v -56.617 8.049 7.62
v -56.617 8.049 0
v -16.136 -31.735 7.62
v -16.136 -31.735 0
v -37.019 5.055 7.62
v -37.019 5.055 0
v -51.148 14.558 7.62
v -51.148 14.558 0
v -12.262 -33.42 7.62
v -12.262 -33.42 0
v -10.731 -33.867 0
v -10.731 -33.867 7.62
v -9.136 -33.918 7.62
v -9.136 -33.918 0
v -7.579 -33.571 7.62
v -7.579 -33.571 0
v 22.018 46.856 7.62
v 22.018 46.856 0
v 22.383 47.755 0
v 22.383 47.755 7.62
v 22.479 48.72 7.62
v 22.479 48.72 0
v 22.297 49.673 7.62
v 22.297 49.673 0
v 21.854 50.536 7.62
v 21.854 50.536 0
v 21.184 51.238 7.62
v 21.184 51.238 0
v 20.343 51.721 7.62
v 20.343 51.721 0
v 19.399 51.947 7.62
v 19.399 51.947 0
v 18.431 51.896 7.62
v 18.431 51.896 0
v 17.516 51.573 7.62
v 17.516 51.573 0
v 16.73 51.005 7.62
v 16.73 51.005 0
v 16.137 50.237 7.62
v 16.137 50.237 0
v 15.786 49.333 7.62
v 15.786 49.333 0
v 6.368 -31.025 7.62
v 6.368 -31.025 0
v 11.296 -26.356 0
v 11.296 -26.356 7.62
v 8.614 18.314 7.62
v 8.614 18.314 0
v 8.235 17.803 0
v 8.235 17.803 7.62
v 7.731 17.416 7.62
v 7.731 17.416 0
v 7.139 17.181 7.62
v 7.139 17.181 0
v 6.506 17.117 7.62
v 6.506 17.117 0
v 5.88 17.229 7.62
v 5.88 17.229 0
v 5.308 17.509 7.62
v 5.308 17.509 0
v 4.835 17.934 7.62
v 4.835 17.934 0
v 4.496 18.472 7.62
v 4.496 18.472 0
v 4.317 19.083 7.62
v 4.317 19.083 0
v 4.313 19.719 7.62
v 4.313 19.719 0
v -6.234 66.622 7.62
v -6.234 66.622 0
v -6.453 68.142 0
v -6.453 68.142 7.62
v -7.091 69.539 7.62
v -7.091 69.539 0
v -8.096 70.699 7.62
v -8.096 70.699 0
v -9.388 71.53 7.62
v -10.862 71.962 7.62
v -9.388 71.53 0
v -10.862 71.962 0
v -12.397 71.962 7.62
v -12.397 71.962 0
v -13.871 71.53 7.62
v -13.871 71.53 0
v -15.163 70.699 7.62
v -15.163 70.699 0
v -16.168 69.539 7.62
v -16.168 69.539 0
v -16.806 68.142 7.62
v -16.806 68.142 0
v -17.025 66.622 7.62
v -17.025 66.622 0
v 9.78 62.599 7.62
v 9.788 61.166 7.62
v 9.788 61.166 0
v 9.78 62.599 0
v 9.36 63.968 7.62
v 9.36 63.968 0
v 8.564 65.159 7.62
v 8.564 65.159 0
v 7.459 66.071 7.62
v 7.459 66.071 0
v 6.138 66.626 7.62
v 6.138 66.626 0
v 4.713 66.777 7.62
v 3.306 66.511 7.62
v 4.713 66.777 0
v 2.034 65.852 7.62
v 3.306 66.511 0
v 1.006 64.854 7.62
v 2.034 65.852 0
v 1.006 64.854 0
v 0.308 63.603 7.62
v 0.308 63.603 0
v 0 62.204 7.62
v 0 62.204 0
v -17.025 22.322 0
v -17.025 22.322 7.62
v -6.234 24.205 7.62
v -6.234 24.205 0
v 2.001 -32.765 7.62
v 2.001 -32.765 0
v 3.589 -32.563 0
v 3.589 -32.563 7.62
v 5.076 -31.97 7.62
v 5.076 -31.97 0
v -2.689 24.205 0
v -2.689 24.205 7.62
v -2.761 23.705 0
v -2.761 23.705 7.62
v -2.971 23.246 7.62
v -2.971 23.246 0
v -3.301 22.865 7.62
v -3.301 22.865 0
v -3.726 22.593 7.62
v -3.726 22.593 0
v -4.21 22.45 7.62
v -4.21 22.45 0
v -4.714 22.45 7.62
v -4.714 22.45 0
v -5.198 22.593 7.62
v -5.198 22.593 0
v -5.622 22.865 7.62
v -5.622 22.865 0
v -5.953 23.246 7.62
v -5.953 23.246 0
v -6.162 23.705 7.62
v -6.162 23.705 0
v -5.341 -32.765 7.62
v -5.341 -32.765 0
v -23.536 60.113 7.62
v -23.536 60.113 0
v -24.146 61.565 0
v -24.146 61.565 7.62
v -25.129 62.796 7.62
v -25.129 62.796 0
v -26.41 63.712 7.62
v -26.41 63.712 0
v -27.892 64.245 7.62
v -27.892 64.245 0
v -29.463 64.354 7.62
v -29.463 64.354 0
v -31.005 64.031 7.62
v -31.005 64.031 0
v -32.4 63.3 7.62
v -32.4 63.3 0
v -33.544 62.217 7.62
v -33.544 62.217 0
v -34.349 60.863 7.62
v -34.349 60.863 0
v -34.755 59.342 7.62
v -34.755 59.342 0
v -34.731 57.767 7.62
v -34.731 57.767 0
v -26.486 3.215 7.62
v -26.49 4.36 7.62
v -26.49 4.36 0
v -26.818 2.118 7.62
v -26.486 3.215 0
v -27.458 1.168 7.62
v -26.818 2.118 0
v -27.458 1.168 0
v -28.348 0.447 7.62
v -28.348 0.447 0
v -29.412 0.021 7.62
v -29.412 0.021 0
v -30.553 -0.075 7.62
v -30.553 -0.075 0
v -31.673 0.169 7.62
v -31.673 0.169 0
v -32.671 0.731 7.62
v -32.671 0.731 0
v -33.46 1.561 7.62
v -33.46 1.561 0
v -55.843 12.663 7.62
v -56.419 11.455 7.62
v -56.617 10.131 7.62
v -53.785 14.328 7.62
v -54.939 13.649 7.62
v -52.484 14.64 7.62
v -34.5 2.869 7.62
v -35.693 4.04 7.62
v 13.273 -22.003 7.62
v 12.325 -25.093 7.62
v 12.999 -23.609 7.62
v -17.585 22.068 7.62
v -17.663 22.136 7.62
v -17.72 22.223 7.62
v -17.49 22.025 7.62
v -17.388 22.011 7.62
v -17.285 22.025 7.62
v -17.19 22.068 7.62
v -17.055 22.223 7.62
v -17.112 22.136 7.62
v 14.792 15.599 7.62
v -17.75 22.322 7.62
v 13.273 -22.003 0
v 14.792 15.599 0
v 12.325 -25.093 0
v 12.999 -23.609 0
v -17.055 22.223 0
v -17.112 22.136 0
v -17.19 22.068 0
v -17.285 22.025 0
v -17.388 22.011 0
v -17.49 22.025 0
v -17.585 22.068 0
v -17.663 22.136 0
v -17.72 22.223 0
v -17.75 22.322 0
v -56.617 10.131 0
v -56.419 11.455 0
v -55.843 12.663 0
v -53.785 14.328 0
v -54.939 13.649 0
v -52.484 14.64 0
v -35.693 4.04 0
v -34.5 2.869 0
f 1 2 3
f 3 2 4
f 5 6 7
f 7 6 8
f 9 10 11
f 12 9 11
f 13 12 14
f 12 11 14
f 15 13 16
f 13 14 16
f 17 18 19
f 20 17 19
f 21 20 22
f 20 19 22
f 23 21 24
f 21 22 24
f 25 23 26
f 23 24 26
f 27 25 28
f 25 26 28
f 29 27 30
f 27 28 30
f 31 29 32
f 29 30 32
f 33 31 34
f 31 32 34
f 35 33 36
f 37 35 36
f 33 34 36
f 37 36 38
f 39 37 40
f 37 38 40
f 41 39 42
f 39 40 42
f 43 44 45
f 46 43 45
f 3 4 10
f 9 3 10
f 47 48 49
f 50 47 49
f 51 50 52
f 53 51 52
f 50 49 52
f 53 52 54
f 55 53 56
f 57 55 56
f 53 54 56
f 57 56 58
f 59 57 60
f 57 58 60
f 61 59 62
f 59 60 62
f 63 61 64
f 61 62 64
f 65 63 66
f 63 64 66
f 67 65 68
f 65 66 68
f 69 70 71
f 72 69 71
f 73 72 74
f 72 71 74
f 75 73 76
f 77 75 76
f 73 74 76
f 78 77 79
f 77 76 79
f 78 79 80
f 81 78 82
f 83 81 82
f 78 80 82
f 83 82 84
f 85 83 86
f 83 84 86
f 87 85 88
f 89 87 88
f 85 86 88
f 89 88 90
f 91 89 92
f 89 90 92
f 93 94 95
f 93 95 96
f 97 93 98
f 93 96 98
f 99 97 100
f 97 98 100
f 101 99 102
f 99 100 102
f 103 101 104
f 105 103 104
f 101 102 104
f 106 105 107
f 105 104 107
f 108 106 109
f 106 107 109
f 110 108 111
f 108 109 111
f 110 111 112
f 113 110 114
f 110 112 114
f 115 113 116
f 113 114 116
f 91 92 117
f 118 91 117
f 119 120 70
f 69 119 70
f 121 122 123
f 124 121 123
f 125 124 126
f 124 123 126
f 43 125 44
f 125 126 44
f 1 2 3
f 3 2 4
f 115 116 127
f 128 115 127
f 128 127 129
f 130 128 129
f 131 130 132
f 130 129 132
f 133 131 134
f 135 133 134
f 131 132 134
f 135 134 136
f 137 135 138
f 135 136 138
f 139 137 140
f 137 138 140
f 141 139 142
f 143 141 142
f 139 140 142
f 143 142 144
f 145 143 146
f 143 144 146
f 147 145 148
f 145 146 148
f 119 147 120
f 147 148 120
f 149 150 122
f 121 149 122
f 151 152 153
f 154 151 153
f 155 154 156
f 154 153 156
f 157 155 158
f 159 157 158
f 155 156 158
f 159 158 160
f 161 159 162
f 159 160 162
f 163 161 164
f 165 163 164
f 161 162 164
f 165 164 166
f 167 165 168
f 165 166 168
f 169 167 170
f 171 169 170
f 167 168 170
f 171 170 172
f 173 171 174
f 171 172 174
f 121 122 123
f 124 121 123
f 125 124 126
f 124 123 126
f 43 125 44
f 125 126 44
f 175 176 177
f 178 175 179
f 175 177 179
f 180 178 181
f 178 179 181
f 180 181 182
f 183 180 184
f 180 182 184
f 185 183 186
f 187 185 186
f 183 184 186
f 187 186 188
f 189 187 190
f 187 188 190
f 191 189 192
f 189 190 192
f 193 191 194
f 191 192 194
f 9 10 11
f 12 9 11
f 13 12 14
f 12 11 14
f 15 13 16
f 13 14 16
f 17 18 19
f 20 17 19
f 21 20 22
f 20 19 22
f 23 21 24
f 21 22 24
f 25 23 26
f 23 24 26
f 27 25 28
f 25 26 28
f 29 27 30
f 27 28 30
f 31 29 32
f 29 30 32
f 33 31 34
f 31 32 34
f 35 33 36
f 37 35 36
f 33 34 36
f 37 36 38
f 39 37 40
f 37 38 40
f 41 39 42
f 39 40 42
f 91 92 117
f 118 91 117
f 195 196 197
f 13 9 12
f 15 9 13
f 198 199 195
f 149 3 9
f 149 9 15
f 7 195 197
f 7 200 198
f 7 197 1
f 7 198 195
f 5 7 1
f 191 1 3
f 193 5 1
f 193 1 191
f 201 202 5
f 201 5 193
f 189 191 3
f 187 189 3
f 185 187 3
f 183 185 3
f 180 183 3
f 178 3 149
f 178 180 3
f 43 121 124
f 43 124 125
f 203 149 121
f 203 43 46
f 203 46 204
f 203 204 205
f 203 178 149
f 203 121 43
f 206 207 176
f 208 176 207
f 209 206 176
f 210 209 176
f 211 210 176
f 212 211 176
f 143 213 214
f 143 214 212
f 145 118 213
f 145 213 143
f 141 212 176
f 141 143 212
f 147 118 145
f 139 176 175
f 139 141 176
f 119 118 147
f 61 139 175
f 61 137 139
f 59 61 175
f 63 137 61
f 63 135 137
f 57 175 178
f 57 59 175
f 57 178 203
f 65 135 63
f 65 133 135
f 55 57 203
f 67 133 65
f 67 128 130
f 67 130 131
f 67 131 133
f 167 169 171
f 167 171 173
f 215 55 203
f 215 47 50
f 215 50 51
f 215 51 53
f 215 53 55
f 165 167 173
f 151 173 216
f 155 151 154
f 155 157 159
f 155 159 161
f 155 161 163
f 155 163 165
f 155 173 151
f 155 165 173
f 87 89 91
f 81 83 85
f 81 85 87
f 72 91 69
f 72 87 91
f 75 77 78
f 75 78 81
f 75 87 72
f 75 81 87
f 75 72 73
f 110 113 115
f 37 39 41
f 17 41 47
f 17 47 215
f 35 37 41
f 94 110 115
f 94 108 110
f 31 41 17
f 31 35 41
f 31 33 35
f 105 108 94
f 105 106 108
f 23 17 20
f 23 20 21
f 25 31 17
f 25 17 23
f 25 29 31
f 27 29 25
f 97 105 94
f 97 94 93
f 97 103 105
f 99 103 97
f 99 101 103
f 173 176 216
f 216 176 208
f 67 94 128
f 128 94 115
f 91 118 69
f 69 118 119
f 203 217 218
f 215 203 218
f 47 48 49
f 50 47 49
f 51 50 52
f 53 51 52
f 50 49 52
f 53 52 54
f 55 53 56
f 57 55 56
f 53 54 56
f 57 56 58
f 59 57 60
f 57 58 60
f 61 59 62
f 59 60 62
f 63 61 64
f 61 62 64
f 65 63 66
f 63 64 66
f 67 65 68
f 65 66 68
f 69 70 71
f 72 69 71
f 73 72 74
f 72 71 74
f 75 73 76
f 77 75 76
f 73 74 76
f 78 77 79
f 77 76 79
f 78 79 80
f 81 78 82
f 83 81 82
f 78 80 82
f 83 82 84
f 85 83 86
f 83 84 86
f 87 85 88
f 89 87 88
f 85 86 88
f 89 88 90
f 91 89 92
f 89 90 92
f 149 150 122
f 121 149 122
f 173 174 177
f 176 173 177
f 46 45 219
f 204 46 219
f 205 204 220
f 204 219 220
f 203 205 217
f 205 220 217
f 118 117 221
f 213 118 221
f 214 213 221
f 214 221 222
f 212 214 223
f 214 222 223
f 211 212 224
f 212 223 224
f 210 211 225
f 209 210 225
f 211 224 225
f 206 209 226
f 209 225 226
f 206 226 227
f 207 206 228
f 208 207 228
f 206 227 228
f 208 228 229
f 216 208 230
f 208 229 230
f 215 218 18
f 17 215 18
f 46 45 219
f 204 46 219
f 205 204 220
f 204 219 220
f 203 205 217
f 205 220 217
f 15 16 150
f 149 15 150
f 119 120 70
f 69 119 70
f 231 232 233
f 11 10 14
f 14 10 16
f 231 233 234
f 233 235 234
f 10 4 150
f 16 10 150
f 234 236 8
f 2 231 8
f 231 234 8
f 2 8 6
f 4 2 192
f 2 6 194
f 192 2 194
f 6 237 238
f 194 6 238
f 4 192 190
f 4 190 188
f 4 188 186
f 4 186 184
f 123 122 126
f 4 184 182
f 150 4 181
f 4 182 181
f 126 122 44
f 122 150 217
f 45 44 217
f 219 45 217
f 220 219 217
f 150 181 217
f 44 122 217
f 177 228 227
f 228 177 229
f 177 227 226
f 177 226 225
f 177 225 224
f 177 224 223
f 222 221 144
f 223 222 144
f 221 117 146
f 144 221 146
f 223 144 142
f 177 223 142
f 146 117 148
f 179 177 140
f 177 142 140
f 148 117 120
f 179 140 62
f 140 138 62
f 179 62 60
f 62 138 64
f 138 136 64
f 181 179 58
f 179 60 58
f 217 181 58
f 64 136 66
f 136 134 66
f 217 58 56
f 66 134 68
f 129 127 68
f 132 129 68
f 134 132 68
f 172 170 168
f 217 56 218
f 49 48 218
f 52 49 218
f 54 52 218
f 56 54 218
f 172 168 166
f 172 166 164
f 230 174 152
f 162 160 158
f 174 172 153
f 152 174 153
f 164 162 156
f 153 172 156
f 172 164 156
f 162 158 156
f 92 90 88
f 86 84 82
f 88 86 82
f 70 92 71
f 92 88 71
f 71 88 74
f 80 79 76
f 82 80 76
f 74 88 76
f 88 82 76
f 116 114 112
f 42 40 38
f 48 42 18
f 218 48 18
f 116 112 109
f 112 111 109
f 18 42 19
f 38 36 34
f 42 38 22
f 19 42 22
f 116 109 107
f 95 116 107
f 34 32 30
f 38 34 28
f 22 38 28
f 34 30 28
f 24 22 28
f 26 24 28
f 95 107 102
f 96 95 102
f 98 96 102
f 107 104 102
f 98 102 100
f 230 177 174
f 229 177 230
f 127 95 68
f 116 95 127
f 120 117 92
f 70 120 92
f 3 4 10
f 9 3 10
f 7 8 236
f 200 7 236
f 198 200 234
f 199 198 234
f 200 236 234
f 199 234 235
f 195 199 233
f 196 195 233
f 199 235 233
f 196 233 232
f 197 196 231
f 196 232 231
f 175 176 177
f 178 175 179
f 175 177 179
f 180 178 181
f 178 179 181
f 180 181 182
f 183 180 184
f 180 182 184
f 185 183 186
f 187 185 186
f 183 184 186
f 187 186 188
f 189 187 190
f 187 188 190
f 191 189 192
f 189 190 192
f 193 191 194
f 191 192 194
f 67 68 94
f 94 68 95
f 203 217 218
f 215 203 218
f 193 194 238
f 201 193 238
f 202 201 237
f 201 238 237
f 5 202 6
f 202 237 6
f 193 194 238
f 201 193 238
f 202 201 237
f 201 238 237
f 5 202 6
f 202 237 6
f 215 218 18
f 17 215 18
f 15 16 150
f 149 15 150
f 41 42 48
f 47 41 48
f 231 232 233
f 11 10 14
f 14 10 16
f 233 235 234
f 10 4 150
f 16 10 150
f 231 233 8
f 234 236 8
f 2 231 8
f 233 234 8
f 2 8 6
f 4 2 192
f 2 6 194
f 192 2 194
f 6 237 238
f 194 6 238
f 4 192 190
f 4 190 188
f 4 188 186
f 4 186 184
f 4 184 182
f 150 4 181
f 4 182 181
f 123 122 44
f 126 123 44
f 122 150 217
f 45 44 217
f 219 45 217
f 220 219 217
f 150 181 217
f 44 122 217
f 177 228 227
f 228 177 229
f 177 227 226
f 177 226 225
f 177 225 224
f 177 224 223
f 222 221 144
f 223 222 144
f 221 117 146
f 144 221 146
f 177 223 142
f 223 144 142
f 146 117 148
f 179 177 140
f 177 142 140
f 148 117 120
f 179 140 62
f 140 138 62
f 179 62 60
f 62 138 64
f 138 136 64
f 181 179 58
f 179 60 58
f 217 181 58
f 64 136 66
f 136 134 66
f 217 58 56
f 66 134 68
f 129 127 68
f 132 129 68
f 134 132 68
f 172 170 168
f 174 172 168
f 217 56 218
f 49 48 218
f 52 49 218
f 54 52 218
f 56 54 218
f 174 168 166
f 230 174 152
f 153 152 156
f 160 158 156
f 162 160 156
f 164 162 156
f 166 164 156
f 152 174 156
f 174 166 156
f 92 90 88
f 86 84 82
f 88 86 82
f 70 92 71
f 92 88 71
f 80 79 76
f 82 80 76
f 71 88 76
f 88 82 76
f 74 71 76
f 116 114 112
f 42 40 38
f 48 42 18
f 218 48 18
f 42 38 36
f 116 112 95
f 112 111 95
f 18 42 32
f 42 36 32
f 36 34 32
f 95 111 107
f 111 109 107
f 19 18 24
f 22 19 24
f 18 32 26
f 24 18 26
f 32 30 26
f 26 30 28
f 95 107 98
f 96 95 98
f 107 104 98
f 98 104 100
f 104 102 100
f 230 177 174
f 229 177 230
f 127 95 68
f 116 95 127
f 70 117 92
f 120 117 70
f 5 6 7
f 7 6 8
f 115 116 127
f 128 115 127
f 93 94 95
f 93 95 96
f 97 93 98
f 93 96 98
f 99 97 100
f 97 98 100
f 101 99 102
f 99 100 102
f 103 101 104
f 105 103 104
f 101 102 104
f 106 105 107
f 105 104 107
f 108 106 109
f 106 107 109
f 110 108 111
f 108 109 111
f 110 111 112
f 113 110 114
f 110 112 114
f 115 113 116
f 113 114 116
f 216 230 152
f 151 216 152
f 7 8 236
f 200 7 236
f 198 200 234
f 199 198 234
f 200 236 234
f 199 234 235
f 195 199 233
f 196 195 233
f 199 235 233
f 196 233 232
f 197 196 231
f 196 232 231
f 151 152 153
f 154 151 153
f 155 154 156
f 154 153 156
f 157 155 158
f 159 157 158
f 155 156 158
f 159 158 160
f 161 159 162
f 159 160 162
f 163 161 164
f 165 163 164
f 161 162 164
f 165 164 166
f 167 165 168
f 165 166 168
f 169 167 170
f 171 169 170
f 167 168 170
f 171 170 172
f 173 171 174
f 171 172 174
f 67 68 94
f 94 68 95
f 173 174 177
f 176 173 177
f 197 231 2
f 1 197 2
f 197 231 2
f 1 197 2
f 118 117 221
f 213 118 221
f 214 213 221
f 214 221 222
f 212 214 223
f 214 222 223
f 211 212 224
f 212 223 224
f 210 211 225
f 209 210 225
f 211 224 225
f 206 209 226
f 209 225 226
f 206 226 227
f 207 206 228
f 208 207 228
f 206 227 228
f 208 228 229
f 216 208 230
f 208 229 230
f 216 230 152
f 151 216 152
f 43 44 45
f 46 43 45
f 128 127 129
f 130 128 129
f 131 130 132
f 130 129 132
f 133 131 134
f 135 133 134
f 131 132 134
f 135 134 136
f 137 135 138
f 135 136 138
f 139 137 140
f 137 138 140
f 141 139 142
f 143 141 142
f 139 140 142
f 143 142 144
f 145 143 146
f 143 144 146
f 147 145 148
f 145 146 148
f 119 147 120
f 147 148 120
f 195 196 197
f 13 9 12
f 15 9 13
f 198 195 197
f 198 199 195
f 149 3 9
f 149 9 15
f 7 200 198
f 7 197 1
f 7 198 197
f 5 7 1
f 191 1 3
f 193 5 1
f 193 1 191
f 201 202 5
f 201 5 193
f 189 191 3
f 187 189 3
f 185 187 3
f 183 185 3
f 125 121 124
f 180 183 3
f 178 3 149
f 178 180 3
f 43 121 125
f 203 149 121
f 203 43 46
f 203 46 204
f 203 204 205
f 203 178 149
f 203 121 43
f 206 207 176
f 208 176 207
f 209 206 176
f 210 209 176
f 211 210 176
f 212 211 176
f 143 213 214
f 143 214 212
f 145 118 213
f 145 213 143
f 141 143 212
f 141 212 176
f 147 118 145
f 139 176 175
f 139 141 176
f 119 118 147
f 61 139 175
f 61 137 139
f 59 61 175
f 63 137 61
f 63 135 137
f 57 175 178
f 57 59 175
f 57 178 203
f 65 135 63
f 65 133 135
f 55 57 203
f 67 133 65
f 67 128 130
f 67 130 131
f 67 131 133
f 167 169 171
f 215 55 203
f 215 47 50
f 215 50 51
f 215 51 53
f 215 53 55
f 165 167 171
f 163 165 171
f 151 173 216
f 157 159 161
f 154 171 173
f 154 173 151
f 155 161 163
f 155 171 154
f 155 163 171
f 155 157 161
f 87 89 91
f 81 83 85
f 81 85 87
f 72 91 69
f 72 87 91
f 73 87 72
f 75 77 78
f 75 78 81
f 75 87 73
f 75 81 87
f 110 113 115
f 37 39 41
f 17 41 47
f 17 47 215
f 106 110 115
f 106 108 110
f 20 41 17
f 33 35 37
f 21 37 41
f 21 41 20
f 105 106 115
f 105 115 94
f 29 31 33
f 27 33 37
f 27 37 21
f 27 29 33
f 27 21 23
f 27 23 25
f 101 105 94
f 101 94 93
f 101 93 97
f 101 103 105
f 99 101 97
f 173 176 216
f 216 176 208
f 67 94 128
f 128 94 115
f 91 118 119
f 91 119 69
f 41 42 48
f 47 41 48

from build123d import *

# Parameters (mm, degrees)
F2_DEPTH = 7.62


with BuildPart() as f2:
    # F0 (on Top) → F2 (new body)
    with BuildSketch(Plane.XY):
        with BuildLine():
            ThreePointArc((-23.5357079655, 60.113042593), (-30.2454210783, 64.2457756232), (-34.7310379148, 57.7666573226))
            Line((-34.7310379148, 57.7666573226), (-26.4902733646, 4.3604136363))
            ThreePointArc((-26.4902733646, 4.3604136363), (-28.8640611312, 0.1943133413), (-33.4599719683, 1.5613772045))
            ThreePointArc((-33.4599719683, 1.5613772045), (-35.0785366802, 3.4725706683), (-37.0194858383, 5.0553304569))
            Line((-37.0194858383, 5.0553304569), (-51.1479377747, 14.5578626543))
            ThreePointArc((-51.1479377747, 14.5578626543), (-54.938754442, 13.6491168294), (-56.6173754632, 10.1308301091))
            Line((-56.6173754632, 10.1308301091), (-56.6173754632, 8.0494266003))
            Line((-56.6173754632, 8.0494266003), (-16.1364711821, -31.7350588739))
            Line((-16.1364711821, -31.7350588739), (-12.2621996492, -33.4195259751))
            ThreePointArc((-12.2621996492, -33.4195259751), (-9.9352680974, -33.9428224896), (-7.5794191189, -33.5707670106))
            Line((-7.5794191189, -33.5707670106), (-5.3406401906, -32.7648067825))
            Line((-5.3406401906, -32.7648067825), (2.0005224682, -32.7648067825))
            ThreePointArc((2.0005224682, -32.7648067825), (4.3510519912, -32.3137482945), (6.3676519732, -31.0246527547))
            Line((6.3676519732, -31.0246527547), (11.2955290824, -26.3562370092))
            ThreePointArc((11.2955290824, -26.3562370092), (12.7098340581, -24.3727031559), (13.2732275699, -22.0026287135))
            Line((13.2732275699, -22.0026287135), (14.7917633876, 15.5985886231))
            Line((14.7917633876, 15.5985886231), (22.0184158534, 46.8564033508))
            ThreePointArc((22.0184158534, 46.8564033508), (20.3429041375, 51.7210198481), (15.7856713104, 49.3328276164))
            Line((15.7856713104, 49.3328276164), (8.6142982273, 18.3141156696))
            ThreePointArc((8.6142982273, 18.3141156696), (5.8800612713, 17.2294749175), (4.3127752073, 19.7186739224))
            Line((4.3127752073, 19.7186739224), (9.7877811641, 61.1661635339))
            ThreePointArc((9.7877811641, 61.1661635339), (5.43127774, 66.7532188415), (0, 62.2039847076))
            Line((0, 62.2039847076), (-2.6894125622, 24.2047067732))
            ThreePointArc((-2.6894125622, 24.2047067732), (-4.461782823, 22.4323365124), (-6.2341530838, 24.2047067732))
            Line((-6.2341530838, 24.2047067732), (-6.2341530838, 66.6218549013))
            ThreePointArc((-6.2341530838, 66.6218549013), (-11.6295390312, 72.0172408487), (-17.0249249786, 66.6218549013))
            Line((-17.0249249786, 66.6218549013), (-17.0249249786, 22.3221201244))
            ThreePointArc((-17.0249249786, 22.3221201244), (-17.387521641, 22.0108104301), (-17.7501183034, 22.3221201244))
            Line((-17.7501183034, 22.3221201244), (-23.5357079655, 60.113042593))
        make_face()
    extrude(amount=F2_DEPTH)


with BuildPart() as f2b:
    # F1 (on face) → F2, piece 2 (new body)
    with BuildSketch(Plane.XY):
        with BuildLine():
            Line((-17.7501183034, 22.3221201244), (-23.5357079655, 60.113042593))
            ThreePointArc((-23.5357079655, 60.113042593), (-30.2454210783, 64.2457756232), (-34.7310379148, 57.7666573226))
            Line((-34.7310379148, 57.7666573226), (-26.4902733646, 4.3604136363))
            ThreePointArc((-26.4902733646, 4.3604136363), (-28.8640611312, 0.1943133413), (-33.4599719683, 1.5613772045))
            ThreePointArc((-33.4599719683, 1.5613772045), (-35.0785366802, 3.4725706683), (-37.0194858383, 5.0553304569))
            Line((-37.0194858383, 5.0553304569), (-51.1479377747, 14.5578626543))
            ThreePointArc((-51.1479377747, 14.5578626543), (-54.938754442, 13.6491168294), (-56.6173754632, 10.1308301091))
            Line((-56.6173754632, 10.1308301091), (-56.6173754632, 8.0494266003))
            Line((-56.6173754632, 8.0494266003), (-16.1364711821, -31.7350588739))
            Line((-16.1364711821, -31.7350588739), (-12.2621996492, -33.4195259751))
            ThreePointArc((-12.2621996492, -33.4195259751), (-9.9352680974, -33.9428224896), (-7.5794191189, -33.5707670106))
            Line((-7.5794191189, -33.5707670106), (-5.3406401906, -32.7648067825))
            Line((-5.3406401906, -32.7648067825), (2.0005224682, -32.7648067825))
            ThreePointArc((2.0005224682, -32.7648067825), (4.3510519912, -32.3137482945), (6.3676519732, -31.0246527547))
            Line((6.3676519732, -31.0246527547), (11.2955290824, -26.3562370092))
            ThreePointArc((11.2955290824, -26.3562370092), (12.7098340581, -24.3727031559), (13.2732275699, -22.0026287135))
            Line((13.2732275699, -22.0026287135), (14.7917633876, 15.5985886231))
            Line((14.7917633876, 15.5985886231), (22.0184158534, 46.8564033508))
            ThreePointArc((22.0184158534, 46.8564033508), (20.3429041375, 51.7210198481), (15.7856713104, 49.3328276164))
            Line((15.7856713104, 49.3328276164), (8.6142982273, 18.3141156696))
            ThreePointArc((8.6142982273, 18.3141156696), (5.8800612713, 17.2294749175), (4.3127752073, 19.7186739224))
            Line((4.3127752073, 19.7186739224), (9.7877811641, 61.1661635339))
            ThreePointArc((9.7877811641, 61.1661635339), (5.43127774, 66.7532188415), (0, 62.2039847076))
            Line((0, 62.2039847076), (-2.6894125622, 24.2047067732))
            ThreePointArc((-2.6894125622, 24.2047067732), (-4.461782823, 22.4323365124), (-6.2341530838, 24.2047067732))
            Line((-6.2341530838, 24.2047067732), (-6.2341530838, 66.6218549013))
            ThreePointArc((-6.2341530838, 66.6218549013), (-11.6295390312, 72.0172408487), (-17.0249249786, 66.6218549013))
            Line((-17.0249249786, 66.6218549013), (-17.0249249786, 22.3221201244))
            ThreePointArc((-17.0249249786, 22.3221201244), (-17.387521641, 22.0108104301), (-17.7501183034, 22.3221201244))
        make_face()
    extrude(amount=F2_DEPTH)


solid = Compound([f2.part, f2b.part])
